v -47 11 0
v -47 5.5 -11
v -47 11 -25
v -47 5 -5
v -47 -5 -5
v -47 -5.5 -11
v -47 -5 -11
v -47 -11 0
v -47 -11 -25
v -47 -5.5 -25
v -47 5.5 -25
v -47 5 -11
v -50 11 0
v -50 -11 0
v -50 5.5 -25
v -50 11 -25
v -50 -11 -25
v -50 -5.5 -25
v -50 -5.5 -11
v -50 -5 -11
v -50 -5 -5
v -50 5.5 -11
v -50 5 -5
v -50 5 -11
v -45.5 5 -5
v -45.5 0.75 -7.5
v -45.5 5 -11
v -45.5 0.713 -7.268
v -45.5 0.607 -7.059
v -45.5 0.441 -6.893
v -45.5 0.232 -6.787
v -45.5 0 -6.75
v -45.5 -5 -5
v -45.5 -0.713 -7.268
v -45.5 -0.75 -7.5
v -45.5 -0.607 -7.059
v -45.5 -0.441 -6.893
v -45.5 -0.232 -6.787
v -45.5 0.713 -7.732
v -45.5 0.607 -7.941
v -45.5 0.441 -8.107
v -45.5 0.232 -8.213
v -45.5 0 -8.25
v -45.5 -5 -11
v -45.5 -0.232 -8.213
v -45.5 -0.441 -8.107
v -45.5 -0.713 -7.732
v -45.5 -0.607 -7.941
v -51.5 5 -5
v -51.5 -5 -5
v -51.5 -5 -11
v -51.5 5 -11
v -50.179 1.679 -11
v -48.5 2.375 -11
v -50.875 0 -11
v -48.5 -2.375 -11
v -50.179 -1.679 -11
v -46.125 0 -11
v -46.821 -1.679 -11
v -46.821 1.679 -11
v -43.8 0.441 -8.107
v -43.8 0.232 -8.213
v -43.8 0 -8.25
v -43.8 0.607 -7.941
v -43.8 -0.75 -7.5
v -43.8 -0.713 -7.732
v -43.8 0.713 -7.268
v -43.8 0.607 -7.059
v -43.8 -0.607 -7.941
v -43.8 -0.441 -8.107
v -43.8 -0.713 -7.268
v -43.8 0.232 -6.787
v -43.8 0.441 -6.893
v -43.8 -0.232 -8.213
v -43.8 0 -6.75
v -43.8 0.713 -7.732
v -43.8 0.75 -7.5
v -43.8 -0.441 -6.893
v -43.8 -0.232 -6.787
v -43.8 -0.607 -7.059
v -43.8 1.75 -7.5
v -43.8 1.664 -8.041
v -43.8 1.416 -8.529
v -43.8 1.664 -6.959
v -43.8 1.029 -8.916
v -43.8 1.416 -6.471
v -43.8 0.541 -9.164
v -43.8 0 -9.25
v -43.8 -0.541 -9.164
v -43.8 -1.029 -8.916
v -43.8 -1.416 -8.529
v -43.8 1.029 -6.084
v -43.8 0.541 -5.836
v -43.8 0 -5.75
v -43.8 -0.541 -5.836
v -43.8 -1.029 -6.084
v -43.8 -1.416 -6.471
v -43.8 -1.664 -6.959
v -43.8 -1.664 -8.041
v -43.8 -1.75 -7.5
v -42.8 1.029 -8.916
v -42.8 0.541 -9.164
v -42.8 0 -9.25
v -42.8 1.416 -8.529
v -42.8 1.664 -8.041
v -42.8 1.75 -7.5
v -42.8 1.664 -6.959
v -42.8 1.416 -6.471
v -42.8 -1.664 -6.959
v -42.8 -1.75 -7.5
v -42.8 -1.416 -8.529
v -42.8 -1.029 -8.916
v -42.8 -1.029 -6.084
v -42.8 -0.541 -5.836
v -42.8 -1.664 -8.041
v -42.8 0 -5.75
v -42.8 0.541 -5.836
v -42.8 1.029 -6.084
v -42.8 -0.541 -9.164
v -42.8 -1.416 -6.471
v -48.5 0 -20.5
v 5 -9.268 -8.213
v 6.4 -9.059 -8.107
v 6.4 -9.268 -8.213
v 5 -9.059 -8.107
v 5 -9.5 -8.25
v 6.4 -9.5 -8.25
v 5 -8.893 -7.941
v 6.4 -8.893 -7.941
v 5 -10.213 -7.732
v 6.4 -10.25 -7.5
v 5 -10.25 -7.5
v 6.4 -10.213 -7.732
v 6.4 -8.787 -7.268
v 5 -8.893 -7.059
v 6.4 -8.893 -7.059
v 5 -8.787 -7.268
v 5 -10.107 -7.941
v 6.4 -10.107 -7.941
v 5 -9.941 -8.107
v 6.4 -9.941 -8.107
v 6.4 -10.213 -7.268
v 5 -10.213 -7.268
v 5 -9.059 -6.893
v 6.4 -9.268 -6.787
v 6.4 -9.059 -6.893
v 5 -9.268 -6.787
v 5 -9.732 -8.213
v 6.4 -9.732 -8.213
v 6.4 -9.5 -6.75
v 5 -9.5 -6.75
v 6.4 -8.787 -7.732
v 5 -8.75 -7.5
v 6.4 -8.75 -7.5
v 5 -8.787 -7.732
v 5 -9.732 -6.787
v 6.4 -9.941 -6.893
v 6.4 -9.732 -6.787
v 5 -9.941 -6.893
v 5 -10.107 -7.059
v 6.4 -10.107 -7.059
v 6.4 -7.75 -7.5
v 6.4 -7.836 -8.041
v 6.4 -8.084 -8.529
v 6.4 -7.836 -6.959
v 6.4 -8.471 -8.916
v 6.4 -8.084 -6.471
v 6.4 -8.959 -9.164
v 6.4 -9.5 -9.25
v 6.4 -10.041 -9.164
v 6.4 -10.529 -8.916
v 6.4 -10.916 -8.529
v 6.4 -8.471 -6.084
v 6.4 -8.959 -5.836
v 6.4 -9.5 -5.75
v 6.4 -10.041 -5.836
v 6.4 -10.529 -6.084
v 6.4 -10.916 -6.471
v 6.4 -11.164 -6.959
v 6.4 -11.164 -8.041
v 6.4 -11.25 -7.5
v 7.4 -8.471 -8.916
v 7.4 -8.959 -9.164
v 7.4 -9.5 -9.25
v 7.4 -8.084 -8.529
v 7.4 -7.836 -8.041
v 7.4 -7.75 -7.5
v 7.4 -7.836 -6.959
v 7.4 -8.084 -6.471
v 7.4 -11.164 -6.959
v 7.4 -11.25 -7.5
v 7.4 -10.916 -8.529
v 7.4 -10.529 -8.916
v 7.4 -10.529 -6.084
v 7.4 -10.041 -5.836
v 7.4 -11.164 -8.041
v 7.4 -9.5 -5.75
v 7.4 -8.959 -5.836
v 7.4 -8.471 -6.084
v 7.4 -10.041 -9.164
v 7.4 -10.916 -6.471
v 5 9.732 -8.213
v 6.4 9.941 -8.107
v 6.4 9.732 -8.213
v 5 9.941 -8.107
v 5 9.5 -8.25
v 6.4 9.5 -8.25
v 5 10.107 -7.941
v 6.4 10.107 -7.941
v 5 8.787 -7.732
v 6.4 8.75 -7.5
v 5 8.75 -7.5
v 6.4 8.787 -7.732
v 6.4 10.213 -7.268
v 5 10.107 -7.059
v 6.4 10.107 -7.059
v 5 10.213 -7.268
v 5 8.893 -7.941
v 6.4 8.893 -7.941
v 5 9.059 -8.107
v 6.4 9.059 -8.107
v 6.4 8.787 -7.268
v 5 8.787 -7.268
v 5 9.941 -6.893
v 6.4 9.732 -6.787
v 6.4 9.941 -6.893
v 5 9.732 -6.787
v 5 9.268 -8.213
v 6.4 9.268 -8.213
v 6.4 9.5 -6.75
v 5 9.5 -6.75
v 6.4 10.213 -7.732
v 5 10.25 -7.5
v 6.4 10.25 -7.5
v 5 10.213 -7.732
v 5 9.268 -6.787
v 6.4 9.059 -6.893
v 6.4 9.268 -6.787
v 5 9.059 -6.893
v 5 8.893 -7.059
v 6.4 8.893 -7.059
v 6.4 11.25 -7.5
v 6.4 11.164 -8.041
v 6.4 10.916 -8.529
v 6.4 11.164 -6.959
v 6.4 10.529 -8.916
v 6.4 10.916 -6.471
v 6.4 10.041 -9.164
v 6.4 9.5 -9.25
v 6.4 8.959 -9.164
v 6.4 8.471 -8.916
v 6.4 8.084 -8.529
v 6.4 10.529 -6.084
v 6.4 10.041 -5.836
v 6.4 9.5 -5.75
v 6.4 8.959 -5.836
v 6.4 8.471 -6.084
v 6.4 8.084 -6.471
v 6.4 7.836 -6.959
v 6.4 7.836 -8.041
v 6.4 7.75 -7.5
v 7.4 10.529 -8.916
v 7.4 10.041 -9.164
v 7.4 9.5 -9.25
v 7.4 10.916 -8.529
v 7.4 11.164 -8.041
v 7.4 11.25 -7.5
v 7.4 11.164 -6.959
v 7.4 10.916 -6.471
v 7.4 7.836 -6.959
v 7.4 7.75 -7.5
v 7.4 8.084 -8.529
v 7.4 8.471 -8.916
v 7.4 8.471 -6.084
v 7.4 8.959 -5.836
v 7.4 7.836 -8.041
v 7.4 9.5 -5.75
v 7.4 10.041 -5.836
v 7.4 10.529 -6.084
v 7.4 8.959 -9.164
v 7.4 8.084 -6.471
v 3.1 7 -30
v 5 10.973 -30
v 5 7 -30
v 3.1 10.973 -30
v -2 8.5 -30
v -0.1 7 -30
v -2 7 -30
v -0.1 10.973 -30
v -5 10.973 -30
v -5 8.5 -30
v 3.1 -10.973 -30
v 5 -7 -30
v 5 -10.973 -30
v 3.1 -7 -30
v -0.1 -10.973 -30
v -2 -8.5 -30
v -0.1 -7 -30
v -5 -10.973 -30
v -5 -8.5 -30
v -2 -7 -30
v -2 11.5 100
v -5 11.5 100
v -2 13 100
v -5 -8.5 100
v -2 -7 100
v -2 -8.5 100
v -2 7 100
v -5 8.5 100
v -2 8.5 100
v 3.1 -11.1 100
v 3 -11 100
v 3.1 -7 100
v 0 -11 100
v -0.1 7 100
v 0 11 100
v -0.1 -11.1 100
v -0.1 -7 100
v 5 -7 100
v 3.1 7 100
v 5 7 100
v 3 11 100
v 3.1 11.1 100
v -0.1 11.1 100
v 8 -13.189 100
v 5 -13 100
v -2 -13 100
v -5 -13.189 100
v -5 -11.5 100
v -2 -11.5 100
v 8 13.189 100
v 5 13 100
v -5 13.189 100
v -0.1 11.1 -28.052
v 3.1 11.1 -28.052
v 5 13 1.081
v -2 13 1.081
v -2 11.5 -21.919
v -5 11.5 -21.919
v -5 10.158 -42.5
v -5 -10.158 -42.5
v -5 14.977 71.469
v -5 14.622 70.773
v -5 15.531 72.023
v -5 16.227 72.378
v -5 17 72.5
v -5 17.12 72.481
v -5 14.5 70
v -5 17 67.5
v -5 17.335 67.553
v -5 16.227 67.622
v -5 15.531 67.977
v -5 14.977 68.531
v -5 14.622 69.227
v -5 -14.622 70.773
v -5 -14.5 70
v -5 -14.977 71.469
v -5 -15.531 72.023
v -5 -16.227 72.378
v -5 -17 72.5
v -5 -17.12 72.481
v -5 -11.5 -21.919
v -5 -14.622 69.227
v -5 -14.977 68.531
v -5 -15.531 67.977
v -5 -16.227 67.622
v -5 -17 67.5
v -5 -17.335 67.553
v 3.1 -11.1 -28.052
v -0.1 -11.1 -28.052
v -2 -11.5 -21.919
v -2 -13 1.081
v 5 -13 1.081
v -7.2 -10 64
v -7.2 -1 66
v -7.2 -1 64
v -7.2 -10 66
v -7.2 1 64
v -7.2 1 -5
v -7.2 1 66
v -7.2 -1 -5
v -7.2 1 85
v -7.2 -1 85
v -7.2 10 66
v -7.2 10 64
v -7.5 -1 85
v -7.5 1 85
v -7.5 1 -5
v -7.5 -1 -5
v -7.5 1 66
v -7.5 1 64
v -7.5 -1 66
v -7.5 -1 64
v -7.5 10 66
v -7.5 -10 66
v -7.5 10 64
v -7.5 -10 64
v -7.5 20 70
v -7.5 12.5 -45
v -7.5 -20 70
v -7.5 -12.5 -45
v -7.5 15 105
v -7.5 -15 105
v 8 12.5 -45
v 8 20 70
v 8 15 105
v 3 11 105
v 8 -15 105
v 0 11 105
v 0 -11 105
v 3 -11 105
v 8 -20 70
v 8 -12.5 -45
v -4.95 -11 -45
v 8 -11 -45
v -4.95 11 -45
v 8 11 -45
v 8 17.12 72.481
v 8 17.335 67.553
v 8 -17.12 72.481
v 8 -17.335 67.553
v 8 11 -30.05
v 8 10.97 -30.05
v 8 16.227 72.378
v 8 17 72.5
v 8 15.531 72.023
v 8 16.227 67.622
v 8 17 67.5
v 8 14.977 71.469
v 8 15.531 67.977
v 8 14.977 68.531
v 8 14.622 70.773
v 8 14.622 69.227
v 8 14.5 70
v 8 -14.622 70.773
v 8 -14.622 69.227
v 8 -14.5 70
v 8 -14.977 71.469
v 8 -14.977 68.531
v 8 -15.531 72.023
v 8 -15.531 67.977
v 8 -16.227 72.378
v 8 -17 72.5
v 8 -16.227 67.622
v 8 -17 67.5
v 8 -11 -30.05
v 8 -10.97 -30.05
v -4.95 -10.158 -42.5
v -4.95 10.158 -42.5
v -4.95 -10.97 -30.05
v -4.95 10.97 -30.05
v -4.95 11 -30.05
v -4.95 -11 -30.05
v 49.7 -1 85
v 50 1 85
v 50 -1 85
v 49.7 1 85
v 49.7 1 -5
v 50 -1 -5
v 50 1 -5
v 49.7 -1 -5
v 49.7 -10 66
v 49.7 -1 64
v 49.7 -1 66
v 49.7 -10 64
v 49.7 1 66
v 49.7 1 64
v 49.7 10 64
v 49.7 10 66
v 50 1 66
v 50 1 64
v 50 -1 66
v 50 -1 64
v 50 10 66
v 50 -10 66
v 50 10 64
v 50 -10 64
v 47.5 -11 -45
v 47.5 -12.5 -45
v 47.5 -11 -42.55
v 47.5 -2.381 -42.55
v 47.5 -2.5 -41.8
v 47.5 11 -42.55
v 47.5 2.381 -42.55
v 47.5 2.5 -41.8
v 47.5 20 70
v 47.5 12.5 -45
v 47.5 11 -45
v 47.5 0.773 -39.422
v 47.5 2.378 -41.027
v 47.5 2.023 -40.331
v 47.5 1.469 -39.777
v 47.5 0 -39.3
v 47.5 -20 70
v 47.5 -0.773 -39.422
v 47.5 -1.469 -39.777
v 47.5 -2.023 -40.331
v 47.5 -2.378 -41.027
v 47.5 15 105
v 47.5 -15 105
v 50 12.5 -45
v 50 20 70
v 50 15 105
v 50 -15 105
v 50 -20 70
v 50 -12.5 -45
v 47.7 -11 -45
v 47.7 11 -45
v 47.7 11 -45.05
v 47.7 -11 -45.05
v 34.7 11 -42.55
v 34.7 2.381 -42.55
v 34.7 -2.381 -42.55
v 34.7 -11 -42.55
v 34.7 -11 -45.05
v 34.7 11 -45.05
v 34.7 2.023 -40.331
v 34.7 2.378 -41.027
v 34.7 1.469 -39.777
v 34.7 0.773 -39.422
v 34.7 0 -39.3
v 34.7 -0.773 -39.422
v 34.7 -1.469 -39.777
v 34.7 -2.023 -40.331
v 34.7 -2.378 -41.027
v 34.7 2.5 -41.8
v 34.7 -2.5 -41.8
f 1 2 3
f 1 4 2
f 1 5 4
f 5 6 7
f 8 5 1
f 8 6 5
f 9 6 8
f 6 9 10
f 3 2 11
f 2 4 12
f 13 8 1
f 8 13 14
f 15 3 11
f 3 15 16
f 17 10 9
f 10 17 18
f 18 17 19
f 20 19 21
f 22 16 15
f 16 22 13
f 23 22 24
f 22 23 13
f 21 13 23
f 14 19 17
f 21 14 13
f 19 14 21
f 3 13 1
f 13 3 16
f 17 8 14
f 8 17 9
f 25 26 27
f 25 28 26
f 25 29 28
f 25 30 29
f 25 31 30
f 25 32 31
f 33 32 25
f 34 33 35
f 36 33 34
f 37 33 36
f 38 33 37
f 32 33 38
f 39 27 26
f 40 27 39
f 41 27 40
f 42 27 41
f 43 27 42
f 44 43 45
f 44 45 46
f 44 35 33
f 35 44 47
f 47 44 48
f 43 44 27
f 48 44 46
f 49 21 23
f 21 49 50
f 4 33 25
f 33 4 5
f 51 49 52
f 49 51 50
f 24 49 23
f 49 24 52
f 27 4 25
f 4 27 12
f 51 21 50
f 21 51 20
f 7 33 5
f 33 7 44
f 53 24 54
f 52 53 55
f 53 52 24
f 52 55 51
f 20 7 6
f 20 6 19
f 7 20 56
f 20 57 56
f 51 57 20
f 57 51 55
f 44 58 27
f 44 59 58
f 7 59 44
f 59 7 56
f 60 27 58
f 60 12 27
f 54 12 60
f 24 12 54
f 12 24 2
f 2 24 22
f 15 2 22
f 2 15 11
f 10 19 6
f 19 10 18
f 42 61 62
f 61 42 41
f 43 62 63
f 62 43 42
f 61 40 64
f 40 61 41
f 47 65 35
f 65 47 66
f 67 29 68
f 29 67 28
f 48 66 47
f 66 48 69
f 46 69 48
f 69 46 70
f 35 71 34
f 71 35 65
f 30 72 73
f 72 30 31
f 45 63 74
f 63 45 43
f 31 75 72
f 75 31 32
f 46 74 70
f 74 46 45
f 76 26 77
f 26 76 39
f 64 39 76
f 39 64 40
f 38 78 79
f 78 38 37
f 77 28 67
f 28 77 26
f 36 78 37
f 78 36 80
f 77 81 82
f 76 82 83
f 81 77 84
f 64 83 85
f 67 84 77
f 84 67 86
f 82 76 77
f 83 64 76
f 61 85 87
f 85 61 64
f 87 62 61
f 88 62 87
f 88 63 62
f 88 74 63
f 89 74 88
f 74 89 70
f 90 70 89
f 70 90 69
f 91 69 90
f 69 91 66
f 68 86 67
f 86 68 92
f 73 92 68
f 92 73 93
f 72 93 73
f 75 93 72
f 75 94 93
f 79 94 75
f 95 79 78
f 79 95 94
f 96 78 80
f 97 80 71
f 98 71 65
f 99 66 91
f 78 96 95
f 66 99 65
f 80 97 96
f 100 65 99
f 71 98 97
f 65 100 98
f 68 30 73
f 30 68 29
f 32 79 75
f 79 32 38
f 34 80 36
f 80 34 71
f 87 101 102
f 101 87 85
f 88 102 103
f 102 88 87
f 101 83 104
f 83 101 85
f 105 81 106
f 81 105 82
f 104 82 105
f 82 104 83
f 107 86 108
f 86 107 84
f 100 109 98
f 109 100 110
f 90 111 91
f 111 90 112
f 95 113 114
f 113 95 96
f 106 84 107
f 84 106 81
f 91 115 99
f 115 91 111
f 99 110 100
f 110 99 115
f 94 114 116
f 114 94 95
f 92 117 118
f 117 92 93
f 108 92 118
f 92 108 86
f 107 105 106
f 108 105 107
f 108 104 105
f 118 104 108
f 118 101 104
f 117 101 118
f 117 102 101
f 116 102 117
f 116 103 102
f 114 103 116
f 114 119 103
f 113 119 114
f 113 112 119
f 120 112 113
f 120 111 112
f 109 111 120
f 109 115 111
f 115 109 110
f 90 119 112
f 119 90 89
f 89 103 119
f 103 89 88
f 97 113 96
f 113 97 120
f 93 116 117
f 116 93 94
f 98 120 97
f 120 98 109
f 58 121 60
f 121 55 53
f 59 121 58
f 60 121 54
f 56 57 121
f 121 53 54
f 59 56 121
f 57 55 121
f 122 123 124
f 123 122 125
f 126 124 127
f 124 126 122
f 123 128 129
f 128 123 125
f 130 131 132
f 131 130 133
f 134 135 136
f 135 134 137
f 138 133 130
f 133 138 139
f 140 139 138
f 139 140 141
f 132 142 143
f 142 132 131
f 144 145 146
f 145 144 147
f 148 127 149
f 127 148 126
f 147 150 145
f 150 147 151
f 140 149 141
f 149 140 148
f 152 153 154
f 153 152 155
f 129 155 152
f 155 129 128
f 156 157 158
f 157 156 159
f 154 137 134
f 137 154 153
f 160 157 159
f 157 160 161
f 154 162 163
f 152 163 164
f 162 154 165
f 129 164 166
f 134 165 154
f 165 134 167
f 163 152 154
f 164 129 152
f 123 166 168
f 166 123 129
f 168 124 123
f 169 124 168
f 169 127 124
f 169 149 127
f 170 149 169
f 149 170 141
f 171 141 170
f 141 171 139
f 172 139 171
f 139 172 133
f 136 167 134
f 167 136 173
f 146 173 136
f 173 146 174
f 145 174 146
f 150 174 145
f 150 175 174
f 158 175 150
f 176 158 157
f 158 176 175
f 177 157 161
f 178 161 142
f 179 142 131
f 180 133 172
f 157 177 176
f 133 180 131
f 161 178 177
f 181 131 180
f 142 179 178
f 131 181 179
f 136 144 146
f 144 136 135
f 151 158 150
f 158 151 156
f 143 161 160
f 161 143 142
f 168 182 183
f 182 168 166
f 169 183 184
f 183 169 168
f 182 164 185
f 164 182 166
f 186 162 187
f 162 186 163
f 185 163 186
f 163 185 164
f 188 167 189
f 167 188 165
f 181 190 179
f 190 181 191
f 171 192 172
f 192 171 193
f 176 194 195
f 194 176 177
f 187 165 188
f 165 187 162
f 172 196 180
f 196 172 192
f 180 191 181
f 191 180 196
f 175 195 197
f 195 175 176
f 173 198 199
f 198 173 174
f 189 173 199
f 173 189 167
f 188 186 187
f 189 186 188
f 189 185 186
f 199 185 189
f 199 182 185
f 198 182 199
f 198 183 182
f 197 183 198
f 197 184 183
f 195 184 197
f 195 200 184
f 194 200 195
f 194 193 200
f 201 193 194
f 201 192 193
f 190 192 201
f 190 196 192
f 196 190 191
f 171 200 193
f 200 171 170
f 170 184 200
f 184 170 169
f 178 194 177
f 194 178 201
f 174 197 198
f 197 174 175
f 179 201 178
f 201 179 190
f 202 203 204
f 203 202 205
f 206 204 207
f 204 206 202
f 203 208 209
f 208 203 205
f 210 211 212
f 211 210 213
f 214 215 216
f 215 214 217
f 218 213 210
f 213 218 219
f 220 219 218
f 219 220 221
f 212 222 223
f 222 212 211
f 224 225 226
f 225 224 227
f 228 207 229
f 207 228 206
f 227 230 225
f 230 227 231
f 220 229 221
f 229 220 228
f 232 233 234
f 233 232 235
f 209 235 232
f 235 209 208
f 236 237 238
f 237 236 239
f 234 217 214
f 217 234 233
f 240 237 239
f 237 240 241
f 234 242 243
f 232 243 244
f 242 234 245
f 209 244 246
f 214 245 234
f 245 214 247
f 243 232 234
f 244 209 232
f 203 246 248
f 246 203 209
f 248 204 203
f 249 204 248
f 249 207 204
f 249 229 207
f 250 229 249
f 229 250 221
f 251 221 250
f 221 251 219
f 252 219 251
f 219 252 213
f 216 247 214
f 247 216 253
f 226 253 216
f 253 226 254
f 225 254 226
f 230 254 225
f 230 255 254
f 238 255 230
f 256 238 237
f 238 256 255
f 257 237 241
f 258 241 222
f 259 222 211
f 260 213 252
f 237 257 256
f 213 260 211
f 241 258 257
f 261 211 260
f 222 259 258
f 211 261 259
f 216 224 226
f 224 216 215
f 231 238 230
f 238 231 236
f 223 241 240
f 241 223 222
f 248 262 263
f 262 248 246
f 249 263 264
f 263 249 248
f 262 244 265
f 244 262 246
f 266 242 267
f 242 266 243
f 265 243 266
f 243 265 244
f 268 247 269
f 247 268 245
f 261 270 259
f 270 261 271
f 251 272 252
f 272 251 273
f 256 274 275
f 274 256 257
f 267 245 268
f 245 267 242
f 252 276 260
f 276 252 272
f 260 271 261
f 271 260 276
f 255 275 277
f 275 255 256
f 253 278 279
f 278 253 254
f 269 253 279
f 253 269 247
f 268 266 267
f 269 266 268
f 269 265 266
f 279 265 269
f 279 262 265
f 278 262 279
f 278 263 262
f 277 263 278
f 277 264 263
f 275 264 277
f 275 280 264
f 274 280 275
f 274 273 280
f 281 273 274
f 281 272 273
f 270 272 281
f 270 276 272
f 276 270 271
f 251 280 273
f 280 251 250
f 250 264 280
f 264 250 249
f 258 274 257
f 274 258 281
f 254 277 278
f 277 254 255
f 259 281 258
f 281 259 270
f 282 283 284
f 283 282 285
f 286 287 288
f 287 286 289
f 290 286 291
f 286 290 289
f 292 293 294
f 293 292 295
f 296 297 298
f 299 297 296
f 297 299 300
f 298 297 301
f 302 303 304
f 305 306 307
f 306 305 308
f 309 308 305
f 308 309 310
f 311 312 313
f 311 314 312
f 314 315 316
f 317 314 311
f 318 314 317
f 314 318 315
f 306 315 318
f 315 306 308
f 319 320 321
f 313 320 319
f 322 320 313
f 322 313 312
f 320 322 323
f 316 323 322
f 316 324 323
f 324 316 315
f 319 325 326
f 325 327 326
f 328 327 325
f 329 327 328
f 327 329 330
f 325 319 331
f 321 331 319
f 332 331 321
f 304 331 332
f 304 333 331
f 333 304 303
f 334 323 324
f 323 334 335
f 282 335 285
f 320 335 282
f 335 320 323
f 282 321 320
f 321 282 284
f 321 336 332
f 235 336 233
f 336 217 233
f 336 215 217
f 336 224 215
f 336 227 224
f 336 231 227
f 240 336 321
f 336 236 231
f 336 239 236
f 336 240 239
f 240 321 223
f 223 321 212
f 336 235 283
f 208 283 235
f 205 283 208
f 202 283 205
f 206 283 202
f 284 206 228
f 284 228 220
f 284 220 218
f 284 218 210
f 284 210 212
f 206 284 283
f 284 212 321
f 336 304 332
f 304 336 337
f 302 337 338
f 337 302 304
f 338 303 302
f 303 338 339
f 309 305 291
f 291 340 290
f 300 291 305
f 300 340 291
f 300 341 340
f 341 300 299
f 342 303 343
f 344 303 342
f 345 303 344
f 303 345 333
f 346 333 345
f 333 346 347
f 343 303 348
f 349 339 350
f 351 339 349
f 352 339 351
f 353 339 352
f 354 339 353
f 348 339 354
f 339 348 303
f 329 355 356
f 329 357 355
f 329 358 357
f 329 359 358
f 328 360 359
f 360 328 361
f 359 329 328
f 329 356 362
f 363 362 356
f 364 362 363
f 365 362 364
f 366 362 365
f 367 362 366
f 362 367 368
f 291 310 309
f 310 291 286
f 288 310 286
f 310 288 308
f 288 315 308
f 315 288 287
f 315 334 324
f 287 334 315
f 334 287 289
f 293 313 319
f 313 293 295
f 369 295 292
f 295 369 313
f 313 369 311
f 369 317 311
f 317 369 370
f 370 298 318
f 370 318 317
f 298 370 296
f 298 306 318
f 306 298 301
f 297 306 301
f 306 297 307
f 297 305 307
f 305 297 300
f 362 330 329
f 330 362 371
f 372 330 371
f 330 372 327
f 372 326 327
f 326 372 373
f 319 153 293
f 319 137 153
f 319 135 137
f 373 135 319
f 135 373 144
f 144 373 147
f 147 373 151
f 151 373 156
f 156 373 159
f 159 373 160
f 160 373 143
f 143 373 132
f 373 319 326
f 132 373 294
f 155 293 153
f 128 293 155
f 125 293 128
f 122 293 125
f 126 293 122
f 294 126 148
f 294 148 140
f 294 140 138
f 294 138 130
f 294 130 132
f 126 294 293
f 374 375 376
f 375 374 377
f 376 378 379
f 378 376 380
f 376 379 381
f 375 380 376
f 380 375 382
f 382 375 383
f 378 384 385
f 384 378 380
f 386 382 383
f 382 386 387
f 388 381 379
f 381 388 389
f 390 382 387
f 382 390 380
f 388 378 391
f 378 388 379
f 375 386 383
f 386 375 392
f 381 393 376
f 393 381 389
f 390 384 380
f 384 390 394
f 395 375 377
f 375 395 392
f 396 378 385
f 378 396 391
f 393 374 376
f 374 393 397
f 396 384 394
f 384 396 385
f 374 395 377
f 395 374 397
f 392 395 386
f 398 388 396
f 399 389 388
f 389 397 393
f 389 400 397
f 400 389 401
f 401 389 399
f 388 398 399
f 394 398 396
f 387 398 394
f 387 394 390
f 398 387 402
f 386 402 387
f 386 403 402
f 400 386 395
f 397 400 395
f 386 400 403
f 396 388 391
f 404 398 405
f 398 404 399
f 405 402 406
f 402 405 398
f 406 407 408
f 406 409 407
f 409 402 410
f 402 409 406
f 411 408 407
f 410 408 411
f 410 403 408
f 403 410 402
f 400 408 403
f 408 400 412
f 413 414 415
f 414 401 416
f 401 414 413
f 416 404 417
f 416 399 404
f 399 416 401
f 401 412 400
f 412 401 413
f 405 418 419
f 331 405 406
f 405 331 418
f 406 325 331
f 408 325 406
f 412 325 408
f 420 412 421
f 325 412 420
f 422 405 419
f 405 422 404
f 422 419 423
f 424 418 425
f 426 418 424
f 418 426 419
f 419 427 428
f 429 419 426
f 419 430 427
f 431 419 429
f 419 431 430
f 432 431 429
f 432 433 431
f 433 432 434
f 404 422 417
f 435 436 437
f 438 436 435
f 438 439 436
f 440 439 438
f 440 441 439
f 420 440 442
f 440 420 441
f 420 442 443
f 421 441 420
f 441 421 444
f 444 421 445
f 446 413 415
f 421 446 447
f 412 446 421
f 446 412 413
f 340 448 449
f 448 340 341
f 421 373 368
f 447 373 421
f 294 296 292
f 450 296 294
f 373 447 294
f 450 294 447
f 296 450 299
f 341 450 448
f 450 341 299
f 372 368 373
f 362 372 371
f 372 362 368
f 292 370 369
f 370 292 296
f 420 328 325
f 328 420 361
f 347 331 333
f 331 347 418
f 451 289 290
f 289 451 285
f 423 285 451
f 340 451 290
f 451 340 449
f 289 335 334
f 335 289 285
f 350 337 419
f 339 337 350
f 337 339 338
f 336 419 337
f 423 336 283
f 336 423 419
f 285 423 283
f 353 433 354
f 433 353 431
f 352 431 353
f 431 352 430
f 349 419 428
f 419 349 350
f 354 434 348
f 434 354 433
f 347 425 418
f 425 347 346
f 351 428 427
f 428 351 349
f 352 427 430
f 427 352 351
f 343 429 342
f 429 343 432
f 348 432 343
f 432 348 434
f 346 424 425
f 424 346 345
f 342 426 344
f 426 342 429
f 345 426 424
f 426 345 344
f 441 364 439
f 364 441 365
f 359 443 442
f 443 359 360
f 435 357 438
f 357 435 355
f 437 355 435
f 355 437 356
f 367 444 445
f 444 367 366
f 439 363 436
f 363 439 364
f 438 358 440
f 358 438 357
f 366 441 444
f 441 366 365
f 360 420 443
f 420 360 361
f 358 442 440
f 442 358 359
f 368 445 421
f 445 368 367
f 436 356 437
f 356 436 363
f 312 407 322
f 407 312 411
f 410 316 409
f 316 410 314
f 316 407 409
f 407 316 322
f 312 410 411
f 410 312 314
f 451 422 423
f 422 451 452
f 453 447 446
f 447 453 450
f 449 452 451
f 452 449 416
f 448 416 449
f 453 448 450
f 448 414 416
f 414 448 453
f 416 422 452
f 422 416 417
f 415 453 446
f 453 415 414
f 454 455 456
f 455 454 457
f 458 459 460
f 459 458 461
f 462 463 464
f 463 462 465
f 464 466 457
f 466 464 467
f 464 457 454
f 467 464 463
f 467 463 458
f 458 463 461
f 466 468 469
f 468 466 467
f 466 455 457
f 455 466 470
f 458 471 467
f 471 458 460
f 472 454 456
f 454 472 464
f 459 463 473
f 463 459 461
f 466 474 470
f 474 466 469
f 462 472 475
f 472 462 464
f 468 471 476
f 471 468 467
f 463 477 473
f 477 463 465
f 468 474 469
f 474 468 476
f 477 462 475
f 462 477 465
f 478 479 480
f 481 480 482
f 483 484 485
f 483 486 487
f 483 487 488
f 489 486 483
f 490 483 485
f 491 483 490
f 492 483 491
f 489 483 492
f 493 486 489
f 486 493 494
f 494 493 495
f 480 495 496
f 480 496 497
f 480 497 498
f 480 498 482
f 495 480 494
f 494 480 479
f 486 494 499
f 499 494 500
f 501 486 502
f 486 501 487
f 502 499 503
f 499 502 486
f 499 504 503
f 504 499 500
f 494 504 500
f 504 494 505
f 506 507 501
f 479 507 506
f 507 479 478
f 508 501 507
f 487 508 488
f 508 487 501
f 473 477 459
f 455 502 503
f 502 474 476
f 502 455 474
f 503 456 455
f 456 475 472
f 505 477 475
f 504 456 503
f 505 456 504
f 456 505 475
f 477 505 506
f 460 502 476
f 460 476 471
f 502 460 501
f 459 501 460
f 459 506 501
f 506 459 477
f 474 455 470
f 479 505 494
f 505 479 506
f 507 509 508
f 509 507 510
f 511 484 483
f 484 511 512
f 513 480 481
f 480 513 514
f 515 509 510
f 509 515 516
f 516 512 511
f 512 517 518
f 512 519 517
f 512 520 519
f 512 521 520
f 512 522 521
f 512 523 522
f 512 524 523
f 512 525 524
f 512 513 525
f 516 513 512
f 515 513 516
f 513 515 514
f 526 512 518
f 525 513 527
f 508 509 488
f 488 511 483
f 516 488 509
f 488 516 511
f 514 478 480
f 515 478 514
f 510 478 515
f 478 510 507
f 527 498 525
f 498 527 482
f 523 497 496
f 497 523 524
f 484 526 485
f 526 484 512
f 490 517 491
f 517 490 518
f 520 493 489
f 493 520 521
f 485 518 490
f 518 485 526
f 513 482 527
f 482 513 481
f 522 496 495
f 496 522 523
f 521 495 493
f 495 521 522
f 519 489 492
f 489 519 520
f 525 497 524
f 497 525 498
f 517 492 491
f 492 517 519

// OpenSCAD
//blade
translate([-50, 0, 0]) {
	polyhedron(
		points=[
			// base
			[0,0,0],
			[1.5,11,0],
			[3,0,0],
			[1.5,-11,0],

			// near tip level
			[0.5,0,82],
			[1.5,8,82],
			[2.5,0,82],
			[1.5,-8,82],

			// tip
			[1.2,0,100],
			[1.5,0.5,100],
			[1.8,0,100],
			[1.5,-0.5,100],
		],
		faces=[
			// first level
			[0,1,2,3], //bottom face
			[0,1,5,4], //TL
			[1,2,6,5], //TR
			[2,3,7,6], //BR
			[3,0,4,7], //BL

			// second level
			[4,5,9,8],
			[5,6,10,9],
			[6,7,11,10],
			[7,4,8,11],

			// tip
			[8,9,10,11],
		]
	);

	//blade socket
	translate([1.5, 0, -12.5]) {
		difference() {
			union() {
				cube(size=[3, 22, 25], center=true);
				cube(size=[6, 10, 15], center=true);
			}
			translate([0, 0, -6]) {
				cube(size=[10, 11, 15], center=true);
			}
		}
		//spike
		translate([0, 0, -3]) {
			cylinder(d1=0, d2=5, h=10, center=true);
		}
		// elastic's post
		translate([1.7, 0, 5]) {
			rotate([0, 90, 0]) {
				cylinder(d=1.5, h=3, $fn=20);
				translate([0, 0, 3]) {
					cylinder(d=3.5, h=1, $fn=20);
				}
			}
		}
	}
}


// rail guides
translate([-2, -13, -30]){
	linear_extrude(130){
		polygon(
			points=[
				[0,0],
				[7,0],
				[7,6],
				[5.1,6],
				[5.1,1.9],
				[1.9,1.9],
				[1.9,6],
				[0,6],
				[0,4.5],
				[-3,4.5],
				[-3,1.5],
				[0,1.5]
			]
		);
		translate([7, 26, 0]) {
			rotate([0, 0, 180]) {
				polygon(
					points=[
						[0,0],
						[7,0],
						[7,1.5],
						[10,1.5],
						[10,4.5],
						[7,4.5],
						[7,6],
						[5.1,6],
						[5.1,1.9],
						[1.9,1.9],
						[1.9,6],
						[0,6],
					]
				);
			}
		}
	}
	// elastic's post
	translate([6.2, 3.5, 22.5]) {
		rotate([0, 90, 0]) {
			cylinder(d=1.5, h=2.2, $fn=20);
			translate([0, 0, 2.2]) {
				cylinder(d=3.5, h=1, $fn=20);
			}
		}
	}
	// elastic's post
	translate([6.2, 22.5, 22.5]) {
		rotate([0, 90, 0]) {
			cylinder(d=1.5, h=2.2, $fn=20);
			translate([0, 0, 2.2]) {
				cylinder(d=3.5, h=1, $fn=20);
			}
		}
	}
}

// handle scale with mechanism
translate([-5, 0, 70]) {
	// coffin back
	difference() {
		rotate([0, -90, 0]) {
			linear_extrude(2.5){
				polygon(
					points=[
						[0,-20],
						[35,-15],
						[35,15],
						[0,20],
						[-115,12.5],
						[-115,-12.5],
					]
				);

			}
		}

		// cross design
		translate([-3.2, 0, 0]) {
			translate([0, 0, -30]) {
				cube(size=[2, 2, 90], center=true);
			}
			translate([0, 0, -5]) {
				cube(size=[2, 20, 2], center=true);
			}
		}
	}


	//coffin border
	difference() {
		union() {
			rotate([0, -90, 180]) {
				linear_extrude(13){
					difference() {
						polygon(
							points=[
								[0,-20],
								[35,-15],
								[35,15],
								[0,20],
								[-115,12.5],
								[-115,-12.5],
							]
						);
						offset(delta=-2.5){
							polygon(
								points=[
									[0,-20],
									[35,-15],
									[35,15],
									[0,20],
									[-115,12.5],
									[-115,-12.5],
								]
							);
						}
					}
				}
			}

			// blade slot block
			translate([0, -15, 30]) {
				cube(size=[13, 30, 5]);
			}

			// screw posts
			translate([6.5, 17, 0]) {
				rotate([0, 90, 0]) {
					cylinder(d=5, h=13, center=true, $fn=20);
				}
			}
			// screw posts
			translate([6.5, -17, 0]) {
				rotate([0, 90, 0]) {
					cylinder(d=5, h=13, center=true, $fn=20);
				}
			}
		}

		// blade slot
		translate([6.5, 0, 32]) {
			cube(size=[3, 22, 10], center=true);
		}

		// hole at the back
		translate([7, 0, -115]) {
			cube(size=[13.9, 22, 29.9], center=true);
		}
	}
}

// handle scale cover
//translate([10.5, 0, 70]) {
translate([50, 0, 70]) {
	difference() {
		rotate([0, -90, 0]) {
			linear_extrude(2.5){
				polygon(
					points=[
						[0,-20],
						[35,-15],
						[35,15],
						[0,20],
						[-115,12.5],
						[-115,-12.5],
					]
				);

			}
		}

		// cross design
		translate([0.7, 0, 0]) {
			translate([0, 0, -30]) {
				cube(size=[2, 2, 90], center=true);
			}
			translate([0, 0, -5]) {
				cube(size=[2, 20, 2], center=true);
			}
		}
	}

	translate([-8.8, 0, -113.8]) {
		cube(size=[13, 22, 2.5], center=true);

		// screw posts
		translate([0, 0, 2]) {
			rotate([0, 90, 0]) {
				cylinder(d=5, h=13, center=true, $fn=20);
			}
		}
	}
}
